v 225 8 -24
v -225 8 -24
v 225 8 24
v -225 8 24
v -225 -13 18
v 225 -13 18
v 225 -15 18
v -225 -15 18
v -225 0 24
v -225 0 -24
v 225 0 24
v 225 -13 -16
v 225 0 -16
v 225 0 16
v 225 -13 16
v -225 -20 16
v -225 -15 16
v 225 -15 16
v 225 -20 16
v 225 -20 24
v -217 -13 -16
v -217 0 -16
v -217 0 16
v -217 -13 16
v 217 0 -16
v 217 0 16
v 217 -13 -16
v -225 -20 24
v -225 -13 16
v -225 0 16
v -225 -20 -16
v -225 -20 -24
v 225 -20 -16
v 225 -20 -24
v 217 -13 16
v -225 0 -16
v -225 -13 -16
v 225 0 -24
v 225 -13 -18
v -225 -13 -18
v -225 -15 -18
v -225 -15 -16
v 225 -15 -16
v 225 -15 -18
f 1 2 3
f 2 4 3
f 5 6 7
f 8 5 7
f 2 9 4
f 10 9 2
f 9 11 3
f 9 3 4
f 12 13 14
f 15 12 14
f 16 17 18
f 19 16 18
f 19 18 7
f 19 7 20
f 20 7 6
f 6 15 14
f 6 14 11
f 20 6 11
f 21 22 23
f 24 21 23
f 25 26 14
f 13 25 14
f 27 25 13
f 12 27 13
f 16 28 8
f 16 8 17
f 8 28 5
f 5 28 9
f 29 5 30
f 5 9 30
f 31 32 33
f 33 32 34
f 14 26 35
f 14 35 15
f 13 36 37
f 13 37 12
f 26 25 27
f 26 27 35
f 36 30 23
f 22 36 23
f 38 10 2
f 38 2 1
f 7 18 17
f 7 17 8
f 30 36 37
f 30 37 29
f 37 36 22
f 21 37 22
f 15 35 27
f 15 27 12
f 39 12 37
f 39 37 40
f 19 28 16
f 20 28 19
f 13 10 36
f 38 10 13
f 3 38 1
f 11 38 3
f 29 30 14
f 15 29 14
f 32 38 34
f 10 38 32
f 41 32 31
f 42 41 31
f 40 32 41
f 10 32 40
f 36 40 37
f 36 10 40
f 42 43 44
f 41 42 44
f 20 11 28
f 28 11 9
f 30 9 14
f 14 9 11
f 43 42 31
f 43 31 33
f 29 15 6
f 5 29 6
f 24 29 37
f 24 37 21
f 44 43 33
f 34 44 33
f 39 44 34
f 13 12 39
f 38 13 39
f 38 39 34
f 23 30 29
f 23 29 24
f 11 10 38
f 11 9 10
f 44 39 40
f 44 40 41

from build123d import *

# Parameters (mm, degrees)
F3_DEPTH = 20
F2_W     = 8
F2_H     = 32
F4_DEPTH = 13
F2_W_2   = 434
F5_DEPTH = 8
F6_W     = 2
F6_H     = 2
F7_DEPTH = 2384


with BuildPart() as f3:
    # F2 (on Front) → F3 (new body)
    with BuildSketch(Plane.XZ):
        Polygon((-217, 16), (217, 16), (225, 16), (225, 24), (217, 24), (-217, 24), (-225, 24), (-225, 16), align=None)
    extrude(amount=F3_DEPTH)

    # F6 (on face) → F7 (cut)
    with BuildSketch(Plane(origin=(-225, 0, 0), x_dir=(0, -1, 0), z_dir=(-1, 0, 0))):
        with Locations((14, 17)):
            Rectangle(F6_W, F6_H)
    extrude(amount=-F7_DEPTH, mode=Mode.SUBTRACT)


with BuildPart() as f4:
    # F2 (on Front) → F4 (new body)
    with BuildSketch(Plane.XZ):
        with Locations((-221, 0)):
            Rectangle(F2_W, F2_H)
    extrude(amount=F4_DEPTH)


with BuildPart() as f4b:
    # F2 (on Front) → F4, piece 2 (new body)
    with BuildSketch(Plane.XZ):
        with Locations((221, 0)):
            Rectangle(F2_W, F2_H)
    extrude(amount=F4_DEPTH)


with BuildPart() as f5:
    # F2 (on Front) → F5 (new body)
    with BuildSketch(Plane.XZ):
        Rectangle(F2_W_2, F2_H)
        Polygon((225, -16), (217, -16), (-217, -16), (-225, -16), (-225, -24), (-217, -24), (217, -24), (225, -24), align=None)
        with Locations((221, 0)):
            Rectangle(F2_W, F2_H)
        Polygon((-217, 16), (217, 16), (225, 16), (225, 24), (217, 24), (-217, 24), (-225, 24), (-225, 16), align=None)
        with Locations((-221, 0)):
            Rectangle(F2_W, F2_H)
    extrude(amount=-F5_DEPTH)


with BuildPart() as f8_1:
    # F8: instance of F3
    add(f3.part.mirror(Plane.XY))


solid = Compound([f3.part, f4.part, f4b.part, f5.part, f8_1.part])
